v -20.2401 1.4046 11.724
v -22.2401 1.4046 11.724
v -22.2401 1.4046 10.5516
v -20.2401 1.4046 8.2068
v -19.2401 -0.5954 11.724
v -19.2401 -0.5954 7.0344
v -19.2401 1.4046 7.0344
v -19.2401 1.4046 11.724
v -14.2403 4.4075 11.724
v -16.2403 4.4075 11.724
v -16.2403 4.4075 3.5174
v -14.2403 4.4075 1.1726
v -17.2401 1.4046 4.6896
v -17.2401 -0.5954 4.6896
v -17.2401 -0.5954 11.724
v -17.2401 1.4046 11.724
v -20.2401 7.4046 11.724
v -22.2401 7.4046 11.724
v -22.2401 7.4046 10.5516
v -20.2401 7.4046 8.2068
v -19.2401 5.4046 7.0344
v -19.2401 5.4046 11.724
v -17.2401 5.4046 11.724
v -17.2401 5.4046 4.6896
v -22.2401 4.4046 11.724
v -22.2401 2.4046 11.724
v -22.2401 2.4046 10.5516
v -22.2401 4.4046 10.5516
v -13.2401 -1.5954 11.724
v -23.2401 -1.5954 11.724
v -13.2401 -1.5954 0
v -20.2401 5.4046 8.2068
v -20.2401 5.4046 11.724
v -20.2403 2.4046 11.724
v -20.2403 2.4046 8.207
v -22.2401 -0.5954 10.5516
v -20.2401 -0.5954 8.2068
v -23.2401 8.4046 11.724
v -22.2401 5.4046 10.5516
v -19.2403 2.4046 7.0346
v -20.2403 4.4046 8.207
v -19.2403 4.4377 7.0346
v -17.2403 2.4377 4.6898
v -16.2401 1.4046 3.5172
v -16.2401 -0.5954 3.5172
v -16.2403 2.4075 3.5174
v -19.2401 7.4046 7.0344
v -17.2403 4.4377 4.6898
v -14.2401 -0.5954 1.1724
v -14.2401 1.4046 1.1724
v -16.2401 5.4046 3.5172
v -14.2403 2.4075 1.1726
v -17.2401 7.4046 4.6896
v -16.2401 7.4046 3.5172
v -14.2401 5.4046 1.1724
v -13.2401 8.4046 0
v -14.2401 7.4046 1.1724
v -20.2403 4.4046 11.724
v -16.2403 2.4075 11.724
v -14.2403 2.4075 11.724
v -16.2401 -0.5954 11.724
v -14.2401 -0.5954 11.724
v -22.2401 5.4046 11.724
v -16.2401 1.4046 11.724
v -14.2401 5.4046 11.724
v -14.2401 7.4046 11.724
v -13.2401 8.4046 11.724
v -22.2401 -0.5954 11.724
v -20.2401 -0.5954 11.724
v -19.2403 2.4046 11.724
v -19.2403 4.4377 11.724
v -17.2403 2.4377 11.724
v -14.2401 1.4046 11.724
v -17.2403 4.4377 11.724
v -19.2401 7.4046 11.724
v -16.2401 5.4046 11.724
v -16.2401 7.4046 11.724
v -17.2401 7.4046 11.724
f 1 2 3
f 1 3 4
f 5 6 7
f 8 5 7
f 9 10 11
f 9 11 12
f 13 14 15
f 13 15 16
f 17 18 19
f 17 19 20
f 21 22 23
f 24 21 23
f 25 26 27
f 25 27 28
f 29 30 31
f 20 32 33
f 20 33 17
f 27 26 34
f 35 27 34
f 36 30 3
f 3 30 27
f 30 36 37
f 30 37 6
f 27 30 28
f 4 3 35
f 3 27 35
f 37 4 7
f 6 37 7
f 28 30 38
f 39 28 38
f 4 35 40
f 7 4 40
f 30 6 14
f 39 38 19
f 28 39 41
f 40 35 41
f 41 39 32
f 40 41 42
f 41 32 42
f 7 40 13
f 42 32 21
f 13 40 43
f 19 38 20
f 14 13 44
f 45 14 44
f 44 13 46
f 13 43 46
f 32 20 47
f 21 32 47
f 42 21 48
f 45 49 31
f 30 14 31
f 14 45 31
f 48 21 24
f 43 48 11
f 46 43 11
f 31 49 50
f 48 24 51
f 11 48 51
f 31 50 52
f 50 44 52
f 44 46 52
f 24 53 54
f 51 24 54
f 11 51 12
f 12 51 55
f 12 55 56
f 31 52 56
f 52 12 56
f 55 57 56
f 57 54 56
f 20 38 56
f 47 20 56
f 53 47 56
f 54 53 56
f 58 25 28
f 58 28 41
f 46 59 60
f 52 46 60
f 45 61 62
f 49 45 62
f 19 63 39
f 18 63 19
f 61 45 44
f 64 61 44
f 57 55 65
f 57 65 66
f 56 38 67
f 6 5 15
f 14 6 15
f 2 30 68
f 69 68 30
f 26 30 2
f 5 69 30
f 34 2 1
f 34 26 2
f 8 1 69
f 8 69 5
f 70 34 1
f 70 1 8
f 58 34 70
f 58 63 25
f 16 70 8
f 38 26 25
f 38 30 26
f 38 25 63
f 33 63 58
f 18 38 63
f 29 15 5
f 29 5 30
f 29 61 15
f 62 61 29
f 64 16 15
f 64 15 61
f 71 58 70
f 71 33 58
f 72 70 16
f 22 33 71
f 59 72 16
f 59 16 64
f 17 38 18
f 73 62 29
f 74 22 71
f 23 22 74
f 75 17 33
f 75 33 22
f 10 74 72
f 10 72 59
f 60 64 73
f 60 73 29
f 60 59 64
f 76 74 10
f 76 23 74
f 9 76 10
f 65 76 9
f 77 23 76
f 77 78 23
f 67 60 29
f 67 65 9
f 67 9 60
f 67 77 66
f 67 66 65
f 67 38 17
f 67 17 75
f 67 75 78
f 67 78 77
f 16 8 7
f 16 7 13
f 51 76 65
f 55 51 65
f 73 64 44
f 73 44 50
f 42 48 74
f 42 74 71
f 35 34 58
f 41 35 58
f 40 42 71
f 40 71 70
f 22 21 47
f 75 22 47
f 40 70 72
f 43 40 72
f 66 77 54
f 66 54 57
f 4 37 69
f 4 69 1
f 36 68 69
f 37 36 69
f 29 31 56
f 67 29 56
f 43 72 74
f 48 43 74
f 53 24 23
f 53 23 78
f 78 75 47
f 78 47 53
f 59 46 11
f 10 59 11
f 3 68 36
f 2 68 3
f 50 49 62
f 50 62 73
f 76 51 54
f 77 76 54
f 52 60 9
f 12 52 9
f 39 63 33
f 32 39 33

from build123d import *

# Parameters (mm, degrees)
F0_W     = 10
F0_H     = 10
F1_DEPTH = 577
F2_W     = 2
F2_H     = 2
F3_DEPTH = 577.001
F4_W     = 1.9998123646
F4_H     = 2
F4_W_2   = 2
F5_DEPTH = 577.001
F6_DEPTH = 500
F7_DEPTH = 65.276
F9_DEPTH = 10.001


with BuildPart() as f1:
    # F0 (on Top) → F1 (new body)
    with BuildSketch(Plane.XY):
        with Locations((-18.2401322573, 3.4046052024)):
            Rectangle(F0_W, F0_H)
    extrude(amount=F1_DEPTH)

    # F2 (on face) → F3 (cut, through all)
    with BuildSketch(Plane.XY.offset(577)):
        with Locations((-21.2401322573, 6.4046052024)):
            Rectangle(F2_W, F2_H)
        with Locations((-18.2401322573, 6.4046052024)):
            Rectangle(F2_W, F2_H)
        with Locations((-15.2401322573, 6.4046052024)):
            Rectangle(F2_W, F2_H)
        with Locations((-15.2401322573, 0.4046052024)):
            Rectangle(F2_W, F2_H)
        with Locations((-18.2401322573, 0.4046052024)):
            Rectangle(F2_W, F2_H)
        with Locations((-21.2401322573, 0.4046052024)):
            Rectangle(F2_W, F2_H)
    extrude(amount=-F3_DEPTH, mode=Mode.SUBTRACT)

    # F4 (on face) → F5 (cut, through all)
    with BuildSketch(Plane.XY.offset(577)):
        with Locations((-21.2402260751, 3.4046052024)):
            Rectangle(F4_W, F4_H)
        Polygon((-17.2403198928, 4.4376994483), (-19.2403198928, 4.4376994483), (-19.2403198928, 2.4046052024), (-17.2403198928, 2.4376994483), align=None)
        with Locations((-15.2403198928, 3.4074539542)):
            Rectangle(F4_W_2, F4_H)
    extrude(amount=-F5_DEPTH, mode=Mode.SUBTRACT)

    # F6 (cut): a face of the model
    f6_faces = [f1.faces().sort_by_distance(p)[0] for p in [
        (-13.3815536136, 3.4046052024, 577),
    ]]
    extrude(f6_faces, amount=-F6_DEPTH, mode=Mode.SUBTRACT)

    # F7 (cut): a face of the model
    f7_faces = [f1.faces().sort_by_distance(p)[0] for p in [
        (-13.3815536136, 3.4046052024, 77),
    ]]
    extrude(f7_faces, amount=-F7_DEPTH, mode=Mode.SUBTRACT)

    # F8 (on face) → F9 (cut, through all)
    with BuildSketch(Plane(origin=(0, 8.4046052024, 0), x_dir=(-1, 0, 0), z_dir=(0, 1, 0))):
        Polygon((23.2401322573, 0), (23.2401322573, 11.724), (13.2401322573, 0), align=None)
    extrude(amount=-F9_DEPTH, mode=Mode.SUBTRACT)


solid = f1.part
